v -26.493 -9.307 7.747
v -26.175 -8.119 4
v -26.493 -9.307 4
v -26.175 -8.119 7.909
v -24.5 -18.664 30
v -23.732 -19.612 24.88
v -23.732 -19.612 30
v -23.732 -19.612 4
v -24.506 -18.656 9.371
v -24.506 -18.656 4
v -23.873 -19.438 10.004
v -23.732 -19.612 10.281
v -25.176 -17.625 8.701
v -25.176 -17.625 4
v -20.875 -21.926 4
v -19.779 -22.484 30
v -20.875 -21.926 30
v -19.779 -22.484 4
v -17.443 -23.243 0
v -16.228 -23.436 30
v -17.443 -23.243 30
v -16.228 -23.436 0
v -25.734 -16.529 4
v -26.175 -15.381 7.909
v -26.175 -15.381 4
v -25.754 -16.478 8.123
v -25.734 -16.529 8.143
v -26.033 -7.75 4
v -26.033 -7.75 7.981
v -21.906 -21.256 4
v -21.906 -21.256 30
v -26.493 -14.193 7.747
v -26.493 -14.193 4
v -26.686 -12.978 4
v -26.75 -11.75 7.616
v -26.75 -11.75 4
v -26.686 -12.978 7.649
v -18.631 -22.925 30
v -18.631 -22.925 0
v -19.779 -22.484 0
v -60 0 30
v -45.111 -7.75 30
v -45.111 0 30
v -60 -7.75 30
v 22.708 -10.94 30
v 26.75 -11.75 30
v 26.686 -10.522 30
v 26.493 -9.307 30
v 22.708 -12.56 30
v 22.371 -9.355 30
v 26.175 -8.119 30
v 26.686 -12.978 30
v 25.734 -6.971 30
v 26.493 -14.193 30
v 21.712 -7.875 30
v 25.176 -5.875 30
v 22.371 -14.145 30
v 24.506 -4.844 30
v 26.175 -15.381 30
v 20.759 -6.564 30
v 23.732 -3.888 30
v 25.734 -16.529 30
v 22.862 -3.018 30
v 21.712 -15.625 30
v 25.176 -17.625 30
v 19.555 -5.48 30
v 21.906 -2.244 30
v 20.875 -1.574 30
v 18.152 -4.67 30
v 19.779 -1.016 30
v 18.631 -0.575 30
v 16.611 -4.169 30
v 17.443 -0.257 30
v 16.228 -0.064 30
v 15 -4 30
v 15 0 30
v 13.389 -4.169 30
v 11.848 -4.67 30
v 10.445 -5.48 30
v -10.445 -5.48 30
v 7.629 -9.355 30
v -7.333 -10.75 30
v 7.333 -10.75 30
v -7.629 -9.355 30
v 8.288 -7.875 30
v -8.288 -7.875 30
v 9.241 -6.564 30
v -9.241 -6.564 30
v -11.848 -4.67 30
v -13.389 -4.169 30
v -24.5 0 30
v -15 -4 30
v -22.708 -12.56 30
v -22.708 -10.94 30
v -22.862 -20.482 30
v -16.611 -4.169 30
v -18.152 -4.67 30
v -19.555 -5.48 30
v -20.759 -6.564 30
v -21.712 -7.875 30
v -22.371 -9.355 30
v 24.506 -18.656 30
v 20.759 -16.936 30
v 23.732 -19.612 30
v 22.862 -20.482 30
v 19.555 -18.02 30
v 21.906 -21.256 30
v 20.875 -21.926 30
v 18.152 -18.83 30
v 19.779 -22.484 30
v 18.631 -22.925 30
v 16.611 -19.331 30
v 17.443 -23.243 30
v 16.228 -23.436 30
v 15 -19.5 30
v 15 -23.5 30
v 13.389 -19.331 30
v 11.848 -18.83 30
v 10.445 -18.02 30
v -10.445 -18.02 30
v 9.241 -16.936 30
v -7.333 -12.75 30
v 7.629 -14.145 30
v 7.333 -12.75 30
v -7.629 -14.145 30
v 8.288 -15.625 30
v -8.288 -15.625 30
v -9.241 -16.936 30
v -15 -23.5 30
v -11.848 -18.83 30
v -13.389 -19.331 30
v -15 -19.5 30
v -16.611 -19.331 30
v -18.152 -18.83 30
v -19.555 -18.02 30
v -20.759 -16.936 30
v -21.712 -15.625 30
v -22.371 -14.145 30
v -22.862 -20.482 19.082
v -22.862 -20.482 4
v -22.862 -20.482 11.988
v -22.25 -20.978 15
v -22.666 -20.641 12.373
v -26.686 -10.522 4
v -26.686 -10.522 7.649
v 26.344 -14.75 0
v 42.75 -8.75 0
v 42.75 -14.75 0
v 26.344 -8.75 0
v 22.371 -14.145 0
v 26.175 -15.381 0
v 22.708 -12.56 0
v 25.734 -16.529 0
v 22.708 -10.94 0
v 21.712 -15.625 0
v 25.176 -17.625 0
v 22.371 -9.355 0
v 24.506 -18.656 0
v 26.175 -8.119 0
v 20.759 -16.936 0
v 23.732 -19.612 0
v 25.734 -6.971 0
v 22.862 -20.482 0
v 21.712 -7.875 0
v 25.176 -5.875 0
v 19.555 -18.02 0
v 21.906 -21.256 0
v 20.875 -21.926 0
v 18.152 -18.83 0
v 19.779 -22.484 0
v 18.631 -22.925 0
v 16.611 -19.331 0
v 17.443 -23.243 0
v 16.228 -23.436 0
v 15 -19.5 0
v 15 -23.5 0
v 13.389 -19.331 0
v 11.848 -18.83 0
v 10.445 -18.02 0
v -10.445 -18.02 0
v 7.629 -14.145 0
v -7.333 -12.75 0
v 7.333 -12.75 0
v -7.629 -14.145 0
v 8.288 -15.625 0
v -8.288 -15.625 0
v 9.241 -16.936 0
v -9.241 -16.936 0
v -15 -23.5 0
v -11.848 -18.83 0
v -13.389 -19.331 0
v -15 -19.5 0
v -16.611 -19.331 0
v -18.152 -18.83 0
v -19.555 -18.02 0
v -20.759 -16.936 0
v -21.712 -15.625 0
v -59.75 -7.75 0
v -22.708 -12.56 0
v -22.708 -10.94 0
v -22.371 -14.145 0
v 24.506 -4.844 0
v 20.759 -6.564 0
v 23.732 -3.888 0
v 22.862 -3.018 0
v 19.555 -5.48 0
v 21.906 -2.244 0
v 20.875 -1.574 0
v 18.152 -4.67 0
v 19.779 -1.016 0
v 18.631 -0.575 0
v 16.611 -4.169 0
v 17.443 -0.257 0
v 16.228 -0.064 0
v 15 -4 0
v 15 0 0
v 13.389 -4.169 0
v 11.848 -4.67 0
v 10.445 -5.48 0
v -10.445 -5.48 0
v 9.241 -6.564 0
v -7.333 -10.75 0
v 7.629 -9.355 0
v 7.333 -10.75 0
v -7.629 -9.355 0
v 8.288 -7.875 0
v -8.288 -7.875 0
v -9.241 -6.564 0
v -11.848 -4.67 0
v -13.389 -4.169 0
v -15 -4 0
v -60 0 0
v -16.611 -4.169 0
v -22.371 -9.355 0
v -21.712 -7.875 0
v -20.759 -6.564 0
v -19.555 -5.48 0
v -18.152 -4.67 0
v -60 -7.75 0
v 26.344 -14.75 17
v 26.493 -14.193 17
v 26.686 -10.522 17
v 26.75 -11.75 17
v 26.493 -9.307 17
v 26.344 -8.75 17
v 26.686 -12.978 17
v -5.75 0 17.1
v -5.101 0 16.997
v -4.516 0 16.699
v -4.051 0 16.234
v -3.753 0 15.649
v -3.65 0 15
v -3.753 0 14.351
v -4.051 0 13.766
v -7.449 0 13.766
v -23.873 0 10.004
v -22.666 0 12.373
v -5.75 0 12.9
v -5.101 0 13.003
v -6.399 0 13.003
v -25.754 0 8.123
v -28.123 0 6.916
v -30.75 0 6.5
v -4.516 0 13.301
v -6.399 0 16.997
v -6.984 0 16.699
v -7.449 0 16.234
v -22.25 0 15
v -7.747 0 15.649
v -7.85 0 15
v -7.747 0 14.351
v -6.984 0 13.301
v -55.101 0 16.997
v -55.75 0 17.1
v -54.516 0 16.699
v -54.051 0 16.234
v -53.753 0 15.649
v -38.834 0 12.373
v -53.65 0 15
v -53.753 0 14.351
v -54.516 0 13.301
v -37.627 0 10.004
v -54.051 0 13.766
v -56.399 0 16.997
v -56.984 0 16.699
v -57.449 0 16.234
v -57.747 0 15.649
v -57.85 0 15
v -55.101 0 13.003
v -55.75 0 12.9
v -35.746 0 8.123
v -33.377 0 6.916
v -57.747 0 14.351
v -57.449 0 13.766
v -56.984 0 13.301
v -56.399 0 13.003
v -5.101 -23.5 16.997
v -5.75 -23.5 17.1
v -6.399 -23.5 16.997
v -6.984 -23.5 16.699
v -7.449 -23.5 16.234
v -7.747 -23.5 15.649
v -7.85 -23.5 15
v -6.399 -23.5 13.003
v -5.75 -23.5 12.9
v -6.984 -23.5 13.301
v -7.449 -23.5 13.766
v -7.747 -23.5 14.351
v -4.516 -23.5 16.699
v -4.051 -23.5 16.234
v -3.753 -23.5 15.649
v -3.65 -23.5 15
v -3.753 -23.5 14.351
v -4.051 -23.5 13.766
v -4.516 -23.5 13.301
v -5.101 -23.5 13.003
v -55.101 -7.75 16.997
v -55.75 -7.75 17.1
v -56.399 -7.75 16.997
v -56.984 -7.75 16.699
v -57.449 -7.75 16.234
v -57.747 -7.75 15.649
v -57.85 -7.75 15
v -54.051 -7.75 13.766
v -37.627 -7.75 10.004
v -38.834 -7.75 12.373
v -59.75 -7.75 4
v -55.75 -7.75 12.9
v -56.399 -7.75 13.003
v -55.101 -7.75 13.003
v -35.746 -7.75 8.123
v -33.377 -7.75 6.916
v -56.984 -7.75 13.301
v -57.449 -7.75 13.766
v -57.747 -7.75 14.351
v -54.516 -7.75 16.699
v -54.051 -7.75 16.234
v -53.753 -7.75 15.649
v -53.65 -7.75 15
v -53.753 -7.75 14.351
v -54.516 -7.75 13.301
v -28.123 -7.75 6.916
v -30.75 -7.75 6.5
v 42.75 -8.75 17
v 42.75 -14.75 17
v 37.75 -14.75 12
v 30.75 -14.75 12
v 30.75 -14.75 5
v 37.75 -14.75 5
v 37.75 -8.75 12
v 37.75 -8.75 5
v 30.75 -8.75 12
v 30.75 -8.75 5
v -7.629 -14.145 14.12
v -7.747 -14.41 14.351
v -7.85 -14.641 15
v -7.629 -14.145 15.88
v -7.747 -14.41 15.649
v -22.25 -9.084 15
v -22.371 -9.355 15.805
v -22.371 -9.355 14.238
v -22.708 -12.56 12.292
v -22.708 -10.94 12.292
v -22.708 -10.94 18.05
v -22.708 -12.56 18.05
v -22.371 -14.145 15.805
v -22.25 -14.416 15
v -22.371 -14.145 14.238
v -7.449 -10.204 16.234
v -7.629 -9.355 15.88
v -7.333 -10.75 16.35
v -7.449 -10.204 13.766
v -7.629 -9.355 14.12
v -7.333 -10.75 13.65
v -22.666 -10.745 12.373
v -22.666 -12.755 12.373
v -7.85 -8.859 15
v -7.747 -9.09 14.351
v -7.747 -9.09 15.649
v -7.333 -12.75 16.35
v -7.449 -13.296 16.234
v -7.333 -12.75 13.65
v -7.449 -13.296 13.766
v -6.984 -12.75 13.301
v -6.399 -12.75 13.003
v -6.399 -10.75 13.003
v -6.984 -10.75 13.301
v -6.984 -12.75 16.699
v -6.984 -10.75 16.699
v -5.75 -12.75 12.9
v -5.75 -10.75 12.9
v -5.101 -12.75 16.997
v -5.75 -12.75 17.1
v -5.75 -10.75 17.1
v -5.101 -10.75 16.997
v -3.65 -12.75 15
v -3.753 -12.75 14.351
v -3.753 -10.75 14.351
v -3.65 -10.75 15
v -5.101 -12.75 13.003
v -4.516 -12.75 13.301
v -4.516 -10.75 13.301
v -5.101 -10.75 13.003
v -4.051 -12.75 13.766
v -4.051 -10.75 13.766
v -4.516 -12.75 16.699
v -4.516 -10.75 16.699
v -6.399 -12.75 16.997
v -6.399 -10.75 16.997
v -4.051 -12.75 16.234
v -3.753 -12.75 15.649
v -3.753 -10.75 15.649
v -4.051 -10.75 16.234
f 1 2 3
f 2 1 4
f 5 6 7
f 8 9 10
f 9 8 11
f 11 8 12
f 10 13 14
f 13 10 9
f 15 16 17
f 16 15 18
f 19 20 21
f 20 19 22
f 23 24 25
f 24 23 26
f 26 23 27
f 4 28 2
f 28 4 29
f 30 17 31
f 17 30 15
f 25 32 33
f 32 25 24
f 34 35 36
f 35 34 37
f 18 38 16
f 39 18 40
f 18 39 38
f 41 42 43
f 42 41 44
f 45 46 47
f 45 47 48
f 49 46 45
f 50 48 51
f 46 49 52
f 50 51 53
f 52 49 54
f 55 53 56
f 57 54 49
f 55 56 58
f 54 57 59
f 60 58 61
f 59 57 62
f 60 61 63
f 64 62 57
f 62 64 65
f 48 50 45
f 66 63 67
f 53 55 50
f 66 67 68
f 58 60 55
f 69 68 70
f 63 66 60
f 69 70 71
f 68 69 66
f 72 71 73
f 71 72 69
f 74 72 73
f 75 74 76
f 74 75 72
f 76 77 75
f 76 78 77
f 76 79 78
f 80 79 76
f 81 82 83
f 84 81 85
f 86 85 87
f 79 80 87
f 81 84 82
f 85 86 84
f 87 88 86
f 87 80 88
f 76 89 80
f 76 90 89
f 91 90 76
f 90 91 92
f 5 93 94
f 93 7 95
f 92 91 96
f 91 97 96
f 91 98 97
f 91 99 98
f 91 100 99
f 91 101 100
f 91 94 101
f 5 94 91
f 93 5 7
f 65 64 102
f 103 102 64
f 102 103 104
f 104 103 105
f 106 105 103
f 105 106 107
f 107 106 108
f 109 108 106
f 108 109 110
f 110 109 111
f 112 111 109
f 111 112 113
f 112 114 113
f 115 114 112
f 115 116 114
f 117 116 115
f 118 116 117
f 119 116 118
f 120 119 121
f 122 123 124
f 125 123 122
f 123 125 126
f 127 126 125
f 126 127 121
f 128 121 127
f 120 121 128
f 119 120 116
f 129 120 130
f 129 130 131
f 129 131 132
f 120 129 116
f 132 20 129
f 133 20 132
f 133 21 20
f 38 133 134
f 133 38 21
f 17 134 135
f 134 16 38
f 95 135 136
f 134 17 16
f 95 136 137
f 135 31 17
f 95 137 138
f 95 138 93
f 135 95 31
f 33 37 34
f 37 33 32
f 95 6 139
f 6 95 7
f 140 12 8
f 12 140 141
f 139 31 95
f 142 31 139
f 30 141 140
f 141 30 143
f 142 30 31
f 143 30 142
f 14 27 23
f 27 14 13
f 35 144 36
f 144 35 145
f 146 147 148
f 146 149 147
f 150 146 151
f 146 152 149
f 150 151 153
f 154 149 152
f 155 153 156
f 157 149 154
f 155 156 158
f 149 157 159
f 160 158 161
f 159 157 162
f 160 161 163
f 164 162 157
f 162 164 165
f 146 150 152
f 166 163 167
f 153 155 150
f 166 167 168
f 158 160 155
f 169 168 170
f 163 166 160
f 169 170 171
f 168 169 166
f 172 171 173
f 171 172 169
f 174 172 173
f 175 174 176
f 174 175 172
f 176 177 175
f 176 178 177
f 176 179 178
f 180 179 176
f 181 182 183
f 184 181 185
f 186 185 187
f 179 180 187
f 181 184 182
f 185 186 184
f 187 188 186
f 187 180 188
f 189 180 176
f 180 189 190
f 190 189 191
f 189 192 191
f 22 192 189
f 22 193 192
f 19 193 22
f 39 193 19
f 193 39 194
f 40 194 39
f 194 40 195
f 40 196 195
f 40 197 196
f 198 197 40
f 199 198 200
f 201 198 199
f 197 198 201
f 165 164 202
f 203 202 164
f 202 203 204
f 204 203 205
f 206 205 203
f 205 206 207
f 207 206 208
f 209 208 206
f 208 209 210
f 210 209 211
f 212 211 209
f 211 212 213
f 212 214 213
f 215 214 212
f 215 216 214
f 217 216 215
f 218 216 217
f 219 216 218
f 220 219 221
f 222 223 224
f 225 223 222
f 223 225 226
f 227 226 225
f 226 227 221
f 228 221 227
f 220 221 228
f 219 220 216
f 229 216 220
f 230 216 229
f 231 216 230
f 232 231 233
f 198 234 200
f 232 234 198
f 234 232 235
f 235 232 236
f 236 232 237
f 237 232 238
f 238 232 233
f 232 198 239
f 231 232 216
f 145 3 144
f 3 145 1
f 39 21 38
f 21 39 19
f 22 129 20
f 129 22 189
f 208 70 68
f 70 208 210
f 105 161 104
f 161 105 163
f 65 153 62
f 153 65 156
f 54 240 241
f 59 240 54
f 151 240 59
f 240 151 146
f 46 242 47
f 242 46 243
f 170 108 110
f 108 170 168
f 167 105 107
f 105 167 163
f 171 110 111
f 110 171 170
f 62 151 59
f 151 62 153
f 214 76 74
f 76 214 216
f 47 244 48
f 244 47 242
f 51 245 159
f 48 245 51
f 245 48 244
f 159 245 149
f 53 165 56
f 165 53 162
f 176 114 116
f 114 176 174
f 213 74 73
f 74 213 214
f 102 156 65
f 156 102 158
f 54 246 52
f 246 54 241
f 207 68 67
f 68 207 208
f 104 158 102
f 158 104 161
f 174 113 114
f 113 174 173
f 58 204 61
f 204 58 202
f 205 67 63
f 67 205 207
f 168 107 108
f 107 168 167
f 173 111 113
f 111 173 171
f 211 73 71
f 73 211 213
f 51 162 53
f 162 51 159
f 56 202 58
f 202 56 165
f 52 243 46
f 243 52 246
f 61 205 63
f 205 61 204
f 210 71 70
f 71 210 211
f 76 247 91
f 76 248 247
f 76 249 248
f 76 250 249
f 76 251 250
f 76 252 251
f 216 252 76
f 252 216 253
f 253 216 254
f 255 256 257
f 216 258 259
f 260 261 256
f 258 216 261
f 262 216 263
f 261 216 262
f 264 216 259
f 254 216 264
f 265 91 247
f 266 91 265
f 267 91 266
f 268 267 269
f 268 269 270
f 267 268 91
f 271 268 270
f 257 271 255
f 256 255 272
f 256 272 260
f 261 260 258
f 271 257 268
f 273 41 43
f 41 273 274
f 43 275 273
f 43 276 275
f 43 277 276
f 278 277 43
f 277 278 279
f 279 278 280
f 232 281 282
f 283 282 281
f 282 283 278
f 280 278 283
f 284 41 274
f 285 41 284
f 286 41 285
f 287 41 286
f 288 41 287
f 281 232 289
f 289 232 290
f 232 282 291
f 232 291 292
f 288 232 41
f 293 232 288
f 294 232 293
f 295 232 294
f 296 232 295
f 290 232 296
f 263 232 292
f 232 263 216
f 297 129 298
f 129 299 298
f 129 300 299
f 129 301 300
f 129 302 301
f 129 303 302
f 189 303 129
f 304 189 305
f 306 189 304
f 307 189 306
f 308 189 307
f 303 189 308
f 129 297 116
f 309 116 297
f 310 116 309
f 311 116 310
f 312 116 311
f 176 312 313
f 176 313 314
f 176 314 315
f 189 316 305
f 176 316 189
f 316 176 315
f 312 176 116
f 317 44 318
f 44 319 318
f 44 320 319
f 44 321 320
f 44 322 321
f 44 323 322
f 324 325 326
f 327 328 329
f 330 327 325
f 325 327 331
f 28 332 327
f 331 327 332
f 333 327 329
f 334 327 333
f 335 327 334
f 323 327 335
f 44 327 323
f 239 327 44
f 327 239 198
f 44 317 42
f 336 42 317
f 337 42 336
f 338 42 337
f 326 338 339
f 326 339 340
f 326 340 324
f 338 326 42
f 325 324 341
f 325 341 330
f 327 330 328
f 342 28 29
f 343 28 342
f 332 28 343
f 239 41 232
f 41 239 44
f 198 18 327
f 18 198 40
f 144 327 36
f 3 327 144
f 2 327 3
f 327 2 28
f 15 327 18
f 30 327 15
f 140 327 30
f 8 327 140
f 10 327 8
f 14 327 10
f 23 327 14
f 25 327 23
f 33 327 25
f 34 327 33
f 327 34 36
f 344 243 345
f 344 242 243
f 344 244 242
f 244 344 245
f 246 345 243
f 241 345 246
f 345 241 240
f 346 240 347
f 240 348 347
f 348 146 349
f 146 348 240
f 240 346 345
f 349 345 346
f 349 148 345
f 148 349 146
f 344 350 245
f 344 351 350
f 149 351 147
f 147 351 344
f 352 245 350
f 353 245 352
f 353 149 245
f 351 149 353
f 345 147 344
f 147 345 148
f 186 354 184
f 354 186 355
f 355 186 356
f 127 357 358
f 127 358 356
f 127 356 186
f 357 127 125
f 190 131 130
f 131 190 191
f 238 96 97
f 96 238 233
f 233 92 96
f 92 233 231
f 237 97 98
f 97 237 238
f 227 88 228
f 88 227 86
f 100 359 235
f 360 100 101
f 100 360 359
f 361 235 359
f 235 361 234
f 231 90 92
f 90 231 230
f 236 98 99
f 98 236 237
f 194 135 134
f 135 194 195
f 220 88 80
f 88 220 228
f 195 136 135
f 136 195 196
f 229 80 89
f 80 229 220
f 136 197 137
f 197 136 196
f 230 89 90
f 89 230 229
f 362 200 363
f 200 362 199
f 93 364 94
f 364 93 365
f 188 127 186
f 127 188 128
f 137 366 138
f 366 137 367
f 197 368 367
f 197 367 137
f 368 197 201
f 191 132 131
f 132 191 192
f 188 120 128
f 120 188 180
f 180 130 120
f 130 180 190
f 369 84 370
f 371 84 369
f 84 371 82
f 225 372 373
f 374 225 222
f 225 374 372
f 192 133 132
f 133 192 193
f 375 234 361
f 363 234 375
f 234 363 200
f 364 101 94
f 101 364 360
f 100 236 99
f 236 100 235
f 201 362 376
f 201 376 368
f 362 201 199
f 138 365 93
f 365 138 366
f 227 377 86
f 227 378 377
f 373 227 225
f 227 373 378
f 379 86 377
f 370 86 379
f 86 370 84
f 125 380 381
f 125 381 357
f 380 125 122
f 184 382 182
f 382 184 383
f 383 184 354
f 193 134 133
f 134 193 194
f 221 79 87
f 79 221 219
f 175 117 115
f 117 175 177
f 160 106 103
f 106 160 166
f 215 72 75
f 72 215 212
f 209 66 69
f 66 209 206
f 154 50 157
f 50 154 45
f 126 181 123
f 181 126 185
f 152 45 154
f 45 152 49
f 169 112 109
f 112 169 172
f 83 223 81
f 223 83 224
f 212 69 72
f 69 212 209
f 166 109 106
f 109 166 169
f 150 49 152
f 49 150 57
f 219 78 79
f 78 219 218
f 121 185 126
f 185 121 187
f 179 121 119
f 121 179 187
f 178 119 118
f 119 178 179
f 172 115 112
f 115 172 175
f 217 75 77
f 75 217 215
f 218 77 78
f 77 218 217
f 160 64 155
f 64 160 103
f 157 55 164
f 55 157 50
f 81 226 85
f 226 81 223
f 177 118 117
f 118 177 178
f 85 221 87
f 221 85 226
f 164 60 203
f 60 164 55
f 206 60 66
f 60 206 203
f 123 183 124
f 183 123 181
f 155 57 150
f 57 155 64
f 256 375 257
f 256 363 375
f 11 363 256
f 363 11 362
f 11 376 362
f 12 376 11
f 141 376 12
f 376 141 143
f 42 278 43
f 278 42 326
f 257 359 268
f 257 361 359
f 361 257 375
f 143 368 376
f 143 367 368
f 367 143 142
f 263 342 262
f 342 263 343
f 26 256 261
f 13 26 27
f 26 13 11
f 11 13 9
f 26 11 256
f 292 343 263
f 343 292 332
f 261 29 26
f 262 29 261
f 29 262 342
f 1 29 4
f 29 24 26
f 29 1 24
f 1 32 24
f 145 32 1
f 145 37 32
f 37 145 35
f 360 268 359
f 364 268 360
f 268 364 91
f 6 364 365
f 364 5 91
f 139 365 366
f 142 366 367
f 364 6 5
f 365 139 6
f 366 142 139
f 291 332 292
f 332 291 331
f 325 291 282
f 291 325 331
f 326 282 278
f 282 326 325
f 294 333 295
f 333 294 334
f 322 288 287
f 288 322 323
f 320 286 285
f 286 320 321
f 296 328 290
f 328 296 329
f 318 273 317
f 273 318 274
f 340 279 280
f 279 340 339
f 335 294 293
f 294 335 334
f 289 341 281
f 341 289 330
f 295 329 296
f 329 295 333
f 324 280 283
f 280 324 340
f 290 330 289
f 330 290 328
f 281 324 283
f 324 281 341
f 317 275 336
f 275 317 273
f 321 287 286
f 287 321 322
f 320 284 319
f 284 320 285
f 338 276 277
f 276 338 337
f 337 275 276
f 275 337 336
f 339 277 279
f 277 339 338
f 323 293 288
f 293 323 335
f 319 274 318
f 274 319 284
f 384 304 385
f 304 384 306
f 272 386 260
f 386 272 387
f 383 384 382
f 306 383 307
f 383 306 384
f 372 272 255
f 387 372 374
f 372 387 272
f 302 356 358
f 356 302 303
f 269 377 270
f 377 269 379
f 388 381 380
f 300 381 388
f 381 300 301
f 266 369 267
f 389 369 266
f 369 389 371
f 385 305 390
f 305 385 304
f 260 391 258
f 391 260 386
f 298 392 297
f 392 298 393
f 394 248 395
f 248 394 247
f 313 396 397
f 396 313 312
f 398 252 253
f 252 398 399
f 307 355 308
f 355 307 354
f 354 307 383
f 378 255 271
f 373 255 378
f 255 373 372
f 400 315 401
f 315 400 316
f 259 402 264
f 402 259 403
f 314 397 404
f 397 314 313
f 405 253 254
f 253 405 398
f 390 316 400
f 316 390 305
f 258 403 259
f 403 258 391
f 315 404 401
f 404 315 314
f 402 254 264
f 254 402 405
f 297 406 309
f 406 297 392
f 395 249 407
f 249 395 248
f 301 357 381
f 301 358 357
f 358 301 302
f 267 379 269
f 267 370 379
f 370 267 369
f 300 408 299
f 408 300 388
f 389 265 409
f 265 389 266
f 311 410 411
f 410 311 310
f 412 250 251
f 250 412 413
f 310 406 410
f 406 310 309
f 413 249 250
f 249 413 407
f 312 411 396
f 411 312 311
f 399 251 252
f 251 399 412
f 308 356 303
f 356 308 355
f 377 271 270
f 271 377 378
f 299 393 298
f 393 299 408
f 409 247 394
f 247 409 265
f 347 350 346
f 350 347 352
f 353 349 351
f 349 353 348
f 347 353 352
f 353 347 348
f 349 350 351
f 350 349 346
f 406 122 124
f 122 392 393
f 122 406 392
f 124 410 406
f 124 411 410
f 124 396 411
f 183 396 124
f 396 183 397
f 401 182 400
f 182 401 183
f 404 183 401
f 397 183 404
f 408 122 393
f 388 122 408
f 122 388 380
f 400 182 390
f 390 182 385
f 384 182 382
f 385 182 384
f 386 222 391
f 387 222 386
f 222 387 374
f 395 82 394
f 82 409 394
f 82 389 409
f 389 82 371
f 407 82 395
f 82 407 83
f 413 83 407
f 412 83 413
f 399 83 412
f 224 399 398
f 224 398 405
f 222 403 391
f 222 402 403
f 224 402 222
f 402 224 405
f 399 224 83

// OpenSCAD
include <wallace2.scad>;

rotate([0,-90,90]) 
x_carriage2();

x_carriage_width = 30;
extruder_mount_hole_spacing = 50;
extruder_shift = extruder_mount_hole_spacing/2 + bearing_size/2 - 2;

module x_carriage2() {

	difference(){
		union(){
	
			// Main mounting plate
			cube([x_carriage_width,extruder_mount_hole_spacing+10,bearing_size/2]);

			// Side flange
			hull(){
				translate([0,0,bearing_size / 2 +4 ]) rotate([0,90,0]) translate([0, x_rod_spacing / 2, 0]) cylinder(r=bearing_size / 2 + 4,h=4,$fn = 30);
				translate([0,bearing_size/2+1+extruder_mount_hole_spacing ,0]) cube([4,1,bearing_size/2]);
			}
			
			// bearing holder
			translate([0,0,bearing_size/2 + 4]) rotate([0,90,0]){		
        union() {
          translate([-bearing_size/2-4,-x_carriage_width/2,0]) cube([bearing_size + 8, x_rod_spacing,x_carriage_width]);
          for(side = [1, -1]) translate([0, side * x_rod_spacing / 2, 0]) cylinder(h=x_carriage_width,r=bearing_size/2 + 4, $fn = 60);
        }
			}

      // belt clip
      translate([0,-x_carriage_width/2-bearing_size/2-4-5-8-3,bearing_size/2+1]) cube([17,x_carriage_width,6]);
		}

     // Belt clip hole
     translate([(17-7)/2,-x_carriage_width/2-bearing_size/2-4-5-8-3+(17-7)/2,bearing_size/2+1/2]) cube([7,7,7]);
    
    // slice for clamping bearings
    translate([-x_carriage_width/2-1,-(x_carriage_width)/2,bearing_size/2+3 ]) cube([x_carriage_width*2+2,x_carriage_width,2]);
    
		
		translate([0,0,bearing_size / 2 + 4]) rotate([0,90,0]){
			
		// linear bearings
		translate([0, x_rod_spacing / 2, -x_carriage_width/2]) rotate([0, 0, 0]) {
			for(end = [0, 1]) mirror([0, end, 0]) translate([0, (end * x_carriage_width),-1 ]) cylinder(r = bearing_size / 2, h = x_carriage_width * 2 + 2, $fn = 30);
		}
		
		// extruder mount hotend hole
		hull(){
			rotate([0,90,0]) translate([-x_carriage_width/2,extruder_shift,-bearing_size/2-4]) cylinder(r=8+.5,h=bearing_size+8+1);
			rotate([0,90,0]) translate([-x_carriage_width/2-20,extruder_shift+5,-bearing_size/2-4]) cylinder(r=10+.5,h=bearing_size+8+1);
		}

		// screw holes for extruder mount
		rotate([0,90,0]) translate([-x_carriage_width/2,extruder_shift+extruder_mount_hole_spacing/2,-bearing_size/2-4]) cylinder(r=2.1,h=bearing_size+8+1);
		rotate([0,90,0]) translate([-x_carriage_width/2,extruder_shift-extruder_mount_hole_spacing/2,-bearing_size/2-4]) cylinder(r=2.1,h=bearing_size+8+1);
		
	}	
	

	}
}
